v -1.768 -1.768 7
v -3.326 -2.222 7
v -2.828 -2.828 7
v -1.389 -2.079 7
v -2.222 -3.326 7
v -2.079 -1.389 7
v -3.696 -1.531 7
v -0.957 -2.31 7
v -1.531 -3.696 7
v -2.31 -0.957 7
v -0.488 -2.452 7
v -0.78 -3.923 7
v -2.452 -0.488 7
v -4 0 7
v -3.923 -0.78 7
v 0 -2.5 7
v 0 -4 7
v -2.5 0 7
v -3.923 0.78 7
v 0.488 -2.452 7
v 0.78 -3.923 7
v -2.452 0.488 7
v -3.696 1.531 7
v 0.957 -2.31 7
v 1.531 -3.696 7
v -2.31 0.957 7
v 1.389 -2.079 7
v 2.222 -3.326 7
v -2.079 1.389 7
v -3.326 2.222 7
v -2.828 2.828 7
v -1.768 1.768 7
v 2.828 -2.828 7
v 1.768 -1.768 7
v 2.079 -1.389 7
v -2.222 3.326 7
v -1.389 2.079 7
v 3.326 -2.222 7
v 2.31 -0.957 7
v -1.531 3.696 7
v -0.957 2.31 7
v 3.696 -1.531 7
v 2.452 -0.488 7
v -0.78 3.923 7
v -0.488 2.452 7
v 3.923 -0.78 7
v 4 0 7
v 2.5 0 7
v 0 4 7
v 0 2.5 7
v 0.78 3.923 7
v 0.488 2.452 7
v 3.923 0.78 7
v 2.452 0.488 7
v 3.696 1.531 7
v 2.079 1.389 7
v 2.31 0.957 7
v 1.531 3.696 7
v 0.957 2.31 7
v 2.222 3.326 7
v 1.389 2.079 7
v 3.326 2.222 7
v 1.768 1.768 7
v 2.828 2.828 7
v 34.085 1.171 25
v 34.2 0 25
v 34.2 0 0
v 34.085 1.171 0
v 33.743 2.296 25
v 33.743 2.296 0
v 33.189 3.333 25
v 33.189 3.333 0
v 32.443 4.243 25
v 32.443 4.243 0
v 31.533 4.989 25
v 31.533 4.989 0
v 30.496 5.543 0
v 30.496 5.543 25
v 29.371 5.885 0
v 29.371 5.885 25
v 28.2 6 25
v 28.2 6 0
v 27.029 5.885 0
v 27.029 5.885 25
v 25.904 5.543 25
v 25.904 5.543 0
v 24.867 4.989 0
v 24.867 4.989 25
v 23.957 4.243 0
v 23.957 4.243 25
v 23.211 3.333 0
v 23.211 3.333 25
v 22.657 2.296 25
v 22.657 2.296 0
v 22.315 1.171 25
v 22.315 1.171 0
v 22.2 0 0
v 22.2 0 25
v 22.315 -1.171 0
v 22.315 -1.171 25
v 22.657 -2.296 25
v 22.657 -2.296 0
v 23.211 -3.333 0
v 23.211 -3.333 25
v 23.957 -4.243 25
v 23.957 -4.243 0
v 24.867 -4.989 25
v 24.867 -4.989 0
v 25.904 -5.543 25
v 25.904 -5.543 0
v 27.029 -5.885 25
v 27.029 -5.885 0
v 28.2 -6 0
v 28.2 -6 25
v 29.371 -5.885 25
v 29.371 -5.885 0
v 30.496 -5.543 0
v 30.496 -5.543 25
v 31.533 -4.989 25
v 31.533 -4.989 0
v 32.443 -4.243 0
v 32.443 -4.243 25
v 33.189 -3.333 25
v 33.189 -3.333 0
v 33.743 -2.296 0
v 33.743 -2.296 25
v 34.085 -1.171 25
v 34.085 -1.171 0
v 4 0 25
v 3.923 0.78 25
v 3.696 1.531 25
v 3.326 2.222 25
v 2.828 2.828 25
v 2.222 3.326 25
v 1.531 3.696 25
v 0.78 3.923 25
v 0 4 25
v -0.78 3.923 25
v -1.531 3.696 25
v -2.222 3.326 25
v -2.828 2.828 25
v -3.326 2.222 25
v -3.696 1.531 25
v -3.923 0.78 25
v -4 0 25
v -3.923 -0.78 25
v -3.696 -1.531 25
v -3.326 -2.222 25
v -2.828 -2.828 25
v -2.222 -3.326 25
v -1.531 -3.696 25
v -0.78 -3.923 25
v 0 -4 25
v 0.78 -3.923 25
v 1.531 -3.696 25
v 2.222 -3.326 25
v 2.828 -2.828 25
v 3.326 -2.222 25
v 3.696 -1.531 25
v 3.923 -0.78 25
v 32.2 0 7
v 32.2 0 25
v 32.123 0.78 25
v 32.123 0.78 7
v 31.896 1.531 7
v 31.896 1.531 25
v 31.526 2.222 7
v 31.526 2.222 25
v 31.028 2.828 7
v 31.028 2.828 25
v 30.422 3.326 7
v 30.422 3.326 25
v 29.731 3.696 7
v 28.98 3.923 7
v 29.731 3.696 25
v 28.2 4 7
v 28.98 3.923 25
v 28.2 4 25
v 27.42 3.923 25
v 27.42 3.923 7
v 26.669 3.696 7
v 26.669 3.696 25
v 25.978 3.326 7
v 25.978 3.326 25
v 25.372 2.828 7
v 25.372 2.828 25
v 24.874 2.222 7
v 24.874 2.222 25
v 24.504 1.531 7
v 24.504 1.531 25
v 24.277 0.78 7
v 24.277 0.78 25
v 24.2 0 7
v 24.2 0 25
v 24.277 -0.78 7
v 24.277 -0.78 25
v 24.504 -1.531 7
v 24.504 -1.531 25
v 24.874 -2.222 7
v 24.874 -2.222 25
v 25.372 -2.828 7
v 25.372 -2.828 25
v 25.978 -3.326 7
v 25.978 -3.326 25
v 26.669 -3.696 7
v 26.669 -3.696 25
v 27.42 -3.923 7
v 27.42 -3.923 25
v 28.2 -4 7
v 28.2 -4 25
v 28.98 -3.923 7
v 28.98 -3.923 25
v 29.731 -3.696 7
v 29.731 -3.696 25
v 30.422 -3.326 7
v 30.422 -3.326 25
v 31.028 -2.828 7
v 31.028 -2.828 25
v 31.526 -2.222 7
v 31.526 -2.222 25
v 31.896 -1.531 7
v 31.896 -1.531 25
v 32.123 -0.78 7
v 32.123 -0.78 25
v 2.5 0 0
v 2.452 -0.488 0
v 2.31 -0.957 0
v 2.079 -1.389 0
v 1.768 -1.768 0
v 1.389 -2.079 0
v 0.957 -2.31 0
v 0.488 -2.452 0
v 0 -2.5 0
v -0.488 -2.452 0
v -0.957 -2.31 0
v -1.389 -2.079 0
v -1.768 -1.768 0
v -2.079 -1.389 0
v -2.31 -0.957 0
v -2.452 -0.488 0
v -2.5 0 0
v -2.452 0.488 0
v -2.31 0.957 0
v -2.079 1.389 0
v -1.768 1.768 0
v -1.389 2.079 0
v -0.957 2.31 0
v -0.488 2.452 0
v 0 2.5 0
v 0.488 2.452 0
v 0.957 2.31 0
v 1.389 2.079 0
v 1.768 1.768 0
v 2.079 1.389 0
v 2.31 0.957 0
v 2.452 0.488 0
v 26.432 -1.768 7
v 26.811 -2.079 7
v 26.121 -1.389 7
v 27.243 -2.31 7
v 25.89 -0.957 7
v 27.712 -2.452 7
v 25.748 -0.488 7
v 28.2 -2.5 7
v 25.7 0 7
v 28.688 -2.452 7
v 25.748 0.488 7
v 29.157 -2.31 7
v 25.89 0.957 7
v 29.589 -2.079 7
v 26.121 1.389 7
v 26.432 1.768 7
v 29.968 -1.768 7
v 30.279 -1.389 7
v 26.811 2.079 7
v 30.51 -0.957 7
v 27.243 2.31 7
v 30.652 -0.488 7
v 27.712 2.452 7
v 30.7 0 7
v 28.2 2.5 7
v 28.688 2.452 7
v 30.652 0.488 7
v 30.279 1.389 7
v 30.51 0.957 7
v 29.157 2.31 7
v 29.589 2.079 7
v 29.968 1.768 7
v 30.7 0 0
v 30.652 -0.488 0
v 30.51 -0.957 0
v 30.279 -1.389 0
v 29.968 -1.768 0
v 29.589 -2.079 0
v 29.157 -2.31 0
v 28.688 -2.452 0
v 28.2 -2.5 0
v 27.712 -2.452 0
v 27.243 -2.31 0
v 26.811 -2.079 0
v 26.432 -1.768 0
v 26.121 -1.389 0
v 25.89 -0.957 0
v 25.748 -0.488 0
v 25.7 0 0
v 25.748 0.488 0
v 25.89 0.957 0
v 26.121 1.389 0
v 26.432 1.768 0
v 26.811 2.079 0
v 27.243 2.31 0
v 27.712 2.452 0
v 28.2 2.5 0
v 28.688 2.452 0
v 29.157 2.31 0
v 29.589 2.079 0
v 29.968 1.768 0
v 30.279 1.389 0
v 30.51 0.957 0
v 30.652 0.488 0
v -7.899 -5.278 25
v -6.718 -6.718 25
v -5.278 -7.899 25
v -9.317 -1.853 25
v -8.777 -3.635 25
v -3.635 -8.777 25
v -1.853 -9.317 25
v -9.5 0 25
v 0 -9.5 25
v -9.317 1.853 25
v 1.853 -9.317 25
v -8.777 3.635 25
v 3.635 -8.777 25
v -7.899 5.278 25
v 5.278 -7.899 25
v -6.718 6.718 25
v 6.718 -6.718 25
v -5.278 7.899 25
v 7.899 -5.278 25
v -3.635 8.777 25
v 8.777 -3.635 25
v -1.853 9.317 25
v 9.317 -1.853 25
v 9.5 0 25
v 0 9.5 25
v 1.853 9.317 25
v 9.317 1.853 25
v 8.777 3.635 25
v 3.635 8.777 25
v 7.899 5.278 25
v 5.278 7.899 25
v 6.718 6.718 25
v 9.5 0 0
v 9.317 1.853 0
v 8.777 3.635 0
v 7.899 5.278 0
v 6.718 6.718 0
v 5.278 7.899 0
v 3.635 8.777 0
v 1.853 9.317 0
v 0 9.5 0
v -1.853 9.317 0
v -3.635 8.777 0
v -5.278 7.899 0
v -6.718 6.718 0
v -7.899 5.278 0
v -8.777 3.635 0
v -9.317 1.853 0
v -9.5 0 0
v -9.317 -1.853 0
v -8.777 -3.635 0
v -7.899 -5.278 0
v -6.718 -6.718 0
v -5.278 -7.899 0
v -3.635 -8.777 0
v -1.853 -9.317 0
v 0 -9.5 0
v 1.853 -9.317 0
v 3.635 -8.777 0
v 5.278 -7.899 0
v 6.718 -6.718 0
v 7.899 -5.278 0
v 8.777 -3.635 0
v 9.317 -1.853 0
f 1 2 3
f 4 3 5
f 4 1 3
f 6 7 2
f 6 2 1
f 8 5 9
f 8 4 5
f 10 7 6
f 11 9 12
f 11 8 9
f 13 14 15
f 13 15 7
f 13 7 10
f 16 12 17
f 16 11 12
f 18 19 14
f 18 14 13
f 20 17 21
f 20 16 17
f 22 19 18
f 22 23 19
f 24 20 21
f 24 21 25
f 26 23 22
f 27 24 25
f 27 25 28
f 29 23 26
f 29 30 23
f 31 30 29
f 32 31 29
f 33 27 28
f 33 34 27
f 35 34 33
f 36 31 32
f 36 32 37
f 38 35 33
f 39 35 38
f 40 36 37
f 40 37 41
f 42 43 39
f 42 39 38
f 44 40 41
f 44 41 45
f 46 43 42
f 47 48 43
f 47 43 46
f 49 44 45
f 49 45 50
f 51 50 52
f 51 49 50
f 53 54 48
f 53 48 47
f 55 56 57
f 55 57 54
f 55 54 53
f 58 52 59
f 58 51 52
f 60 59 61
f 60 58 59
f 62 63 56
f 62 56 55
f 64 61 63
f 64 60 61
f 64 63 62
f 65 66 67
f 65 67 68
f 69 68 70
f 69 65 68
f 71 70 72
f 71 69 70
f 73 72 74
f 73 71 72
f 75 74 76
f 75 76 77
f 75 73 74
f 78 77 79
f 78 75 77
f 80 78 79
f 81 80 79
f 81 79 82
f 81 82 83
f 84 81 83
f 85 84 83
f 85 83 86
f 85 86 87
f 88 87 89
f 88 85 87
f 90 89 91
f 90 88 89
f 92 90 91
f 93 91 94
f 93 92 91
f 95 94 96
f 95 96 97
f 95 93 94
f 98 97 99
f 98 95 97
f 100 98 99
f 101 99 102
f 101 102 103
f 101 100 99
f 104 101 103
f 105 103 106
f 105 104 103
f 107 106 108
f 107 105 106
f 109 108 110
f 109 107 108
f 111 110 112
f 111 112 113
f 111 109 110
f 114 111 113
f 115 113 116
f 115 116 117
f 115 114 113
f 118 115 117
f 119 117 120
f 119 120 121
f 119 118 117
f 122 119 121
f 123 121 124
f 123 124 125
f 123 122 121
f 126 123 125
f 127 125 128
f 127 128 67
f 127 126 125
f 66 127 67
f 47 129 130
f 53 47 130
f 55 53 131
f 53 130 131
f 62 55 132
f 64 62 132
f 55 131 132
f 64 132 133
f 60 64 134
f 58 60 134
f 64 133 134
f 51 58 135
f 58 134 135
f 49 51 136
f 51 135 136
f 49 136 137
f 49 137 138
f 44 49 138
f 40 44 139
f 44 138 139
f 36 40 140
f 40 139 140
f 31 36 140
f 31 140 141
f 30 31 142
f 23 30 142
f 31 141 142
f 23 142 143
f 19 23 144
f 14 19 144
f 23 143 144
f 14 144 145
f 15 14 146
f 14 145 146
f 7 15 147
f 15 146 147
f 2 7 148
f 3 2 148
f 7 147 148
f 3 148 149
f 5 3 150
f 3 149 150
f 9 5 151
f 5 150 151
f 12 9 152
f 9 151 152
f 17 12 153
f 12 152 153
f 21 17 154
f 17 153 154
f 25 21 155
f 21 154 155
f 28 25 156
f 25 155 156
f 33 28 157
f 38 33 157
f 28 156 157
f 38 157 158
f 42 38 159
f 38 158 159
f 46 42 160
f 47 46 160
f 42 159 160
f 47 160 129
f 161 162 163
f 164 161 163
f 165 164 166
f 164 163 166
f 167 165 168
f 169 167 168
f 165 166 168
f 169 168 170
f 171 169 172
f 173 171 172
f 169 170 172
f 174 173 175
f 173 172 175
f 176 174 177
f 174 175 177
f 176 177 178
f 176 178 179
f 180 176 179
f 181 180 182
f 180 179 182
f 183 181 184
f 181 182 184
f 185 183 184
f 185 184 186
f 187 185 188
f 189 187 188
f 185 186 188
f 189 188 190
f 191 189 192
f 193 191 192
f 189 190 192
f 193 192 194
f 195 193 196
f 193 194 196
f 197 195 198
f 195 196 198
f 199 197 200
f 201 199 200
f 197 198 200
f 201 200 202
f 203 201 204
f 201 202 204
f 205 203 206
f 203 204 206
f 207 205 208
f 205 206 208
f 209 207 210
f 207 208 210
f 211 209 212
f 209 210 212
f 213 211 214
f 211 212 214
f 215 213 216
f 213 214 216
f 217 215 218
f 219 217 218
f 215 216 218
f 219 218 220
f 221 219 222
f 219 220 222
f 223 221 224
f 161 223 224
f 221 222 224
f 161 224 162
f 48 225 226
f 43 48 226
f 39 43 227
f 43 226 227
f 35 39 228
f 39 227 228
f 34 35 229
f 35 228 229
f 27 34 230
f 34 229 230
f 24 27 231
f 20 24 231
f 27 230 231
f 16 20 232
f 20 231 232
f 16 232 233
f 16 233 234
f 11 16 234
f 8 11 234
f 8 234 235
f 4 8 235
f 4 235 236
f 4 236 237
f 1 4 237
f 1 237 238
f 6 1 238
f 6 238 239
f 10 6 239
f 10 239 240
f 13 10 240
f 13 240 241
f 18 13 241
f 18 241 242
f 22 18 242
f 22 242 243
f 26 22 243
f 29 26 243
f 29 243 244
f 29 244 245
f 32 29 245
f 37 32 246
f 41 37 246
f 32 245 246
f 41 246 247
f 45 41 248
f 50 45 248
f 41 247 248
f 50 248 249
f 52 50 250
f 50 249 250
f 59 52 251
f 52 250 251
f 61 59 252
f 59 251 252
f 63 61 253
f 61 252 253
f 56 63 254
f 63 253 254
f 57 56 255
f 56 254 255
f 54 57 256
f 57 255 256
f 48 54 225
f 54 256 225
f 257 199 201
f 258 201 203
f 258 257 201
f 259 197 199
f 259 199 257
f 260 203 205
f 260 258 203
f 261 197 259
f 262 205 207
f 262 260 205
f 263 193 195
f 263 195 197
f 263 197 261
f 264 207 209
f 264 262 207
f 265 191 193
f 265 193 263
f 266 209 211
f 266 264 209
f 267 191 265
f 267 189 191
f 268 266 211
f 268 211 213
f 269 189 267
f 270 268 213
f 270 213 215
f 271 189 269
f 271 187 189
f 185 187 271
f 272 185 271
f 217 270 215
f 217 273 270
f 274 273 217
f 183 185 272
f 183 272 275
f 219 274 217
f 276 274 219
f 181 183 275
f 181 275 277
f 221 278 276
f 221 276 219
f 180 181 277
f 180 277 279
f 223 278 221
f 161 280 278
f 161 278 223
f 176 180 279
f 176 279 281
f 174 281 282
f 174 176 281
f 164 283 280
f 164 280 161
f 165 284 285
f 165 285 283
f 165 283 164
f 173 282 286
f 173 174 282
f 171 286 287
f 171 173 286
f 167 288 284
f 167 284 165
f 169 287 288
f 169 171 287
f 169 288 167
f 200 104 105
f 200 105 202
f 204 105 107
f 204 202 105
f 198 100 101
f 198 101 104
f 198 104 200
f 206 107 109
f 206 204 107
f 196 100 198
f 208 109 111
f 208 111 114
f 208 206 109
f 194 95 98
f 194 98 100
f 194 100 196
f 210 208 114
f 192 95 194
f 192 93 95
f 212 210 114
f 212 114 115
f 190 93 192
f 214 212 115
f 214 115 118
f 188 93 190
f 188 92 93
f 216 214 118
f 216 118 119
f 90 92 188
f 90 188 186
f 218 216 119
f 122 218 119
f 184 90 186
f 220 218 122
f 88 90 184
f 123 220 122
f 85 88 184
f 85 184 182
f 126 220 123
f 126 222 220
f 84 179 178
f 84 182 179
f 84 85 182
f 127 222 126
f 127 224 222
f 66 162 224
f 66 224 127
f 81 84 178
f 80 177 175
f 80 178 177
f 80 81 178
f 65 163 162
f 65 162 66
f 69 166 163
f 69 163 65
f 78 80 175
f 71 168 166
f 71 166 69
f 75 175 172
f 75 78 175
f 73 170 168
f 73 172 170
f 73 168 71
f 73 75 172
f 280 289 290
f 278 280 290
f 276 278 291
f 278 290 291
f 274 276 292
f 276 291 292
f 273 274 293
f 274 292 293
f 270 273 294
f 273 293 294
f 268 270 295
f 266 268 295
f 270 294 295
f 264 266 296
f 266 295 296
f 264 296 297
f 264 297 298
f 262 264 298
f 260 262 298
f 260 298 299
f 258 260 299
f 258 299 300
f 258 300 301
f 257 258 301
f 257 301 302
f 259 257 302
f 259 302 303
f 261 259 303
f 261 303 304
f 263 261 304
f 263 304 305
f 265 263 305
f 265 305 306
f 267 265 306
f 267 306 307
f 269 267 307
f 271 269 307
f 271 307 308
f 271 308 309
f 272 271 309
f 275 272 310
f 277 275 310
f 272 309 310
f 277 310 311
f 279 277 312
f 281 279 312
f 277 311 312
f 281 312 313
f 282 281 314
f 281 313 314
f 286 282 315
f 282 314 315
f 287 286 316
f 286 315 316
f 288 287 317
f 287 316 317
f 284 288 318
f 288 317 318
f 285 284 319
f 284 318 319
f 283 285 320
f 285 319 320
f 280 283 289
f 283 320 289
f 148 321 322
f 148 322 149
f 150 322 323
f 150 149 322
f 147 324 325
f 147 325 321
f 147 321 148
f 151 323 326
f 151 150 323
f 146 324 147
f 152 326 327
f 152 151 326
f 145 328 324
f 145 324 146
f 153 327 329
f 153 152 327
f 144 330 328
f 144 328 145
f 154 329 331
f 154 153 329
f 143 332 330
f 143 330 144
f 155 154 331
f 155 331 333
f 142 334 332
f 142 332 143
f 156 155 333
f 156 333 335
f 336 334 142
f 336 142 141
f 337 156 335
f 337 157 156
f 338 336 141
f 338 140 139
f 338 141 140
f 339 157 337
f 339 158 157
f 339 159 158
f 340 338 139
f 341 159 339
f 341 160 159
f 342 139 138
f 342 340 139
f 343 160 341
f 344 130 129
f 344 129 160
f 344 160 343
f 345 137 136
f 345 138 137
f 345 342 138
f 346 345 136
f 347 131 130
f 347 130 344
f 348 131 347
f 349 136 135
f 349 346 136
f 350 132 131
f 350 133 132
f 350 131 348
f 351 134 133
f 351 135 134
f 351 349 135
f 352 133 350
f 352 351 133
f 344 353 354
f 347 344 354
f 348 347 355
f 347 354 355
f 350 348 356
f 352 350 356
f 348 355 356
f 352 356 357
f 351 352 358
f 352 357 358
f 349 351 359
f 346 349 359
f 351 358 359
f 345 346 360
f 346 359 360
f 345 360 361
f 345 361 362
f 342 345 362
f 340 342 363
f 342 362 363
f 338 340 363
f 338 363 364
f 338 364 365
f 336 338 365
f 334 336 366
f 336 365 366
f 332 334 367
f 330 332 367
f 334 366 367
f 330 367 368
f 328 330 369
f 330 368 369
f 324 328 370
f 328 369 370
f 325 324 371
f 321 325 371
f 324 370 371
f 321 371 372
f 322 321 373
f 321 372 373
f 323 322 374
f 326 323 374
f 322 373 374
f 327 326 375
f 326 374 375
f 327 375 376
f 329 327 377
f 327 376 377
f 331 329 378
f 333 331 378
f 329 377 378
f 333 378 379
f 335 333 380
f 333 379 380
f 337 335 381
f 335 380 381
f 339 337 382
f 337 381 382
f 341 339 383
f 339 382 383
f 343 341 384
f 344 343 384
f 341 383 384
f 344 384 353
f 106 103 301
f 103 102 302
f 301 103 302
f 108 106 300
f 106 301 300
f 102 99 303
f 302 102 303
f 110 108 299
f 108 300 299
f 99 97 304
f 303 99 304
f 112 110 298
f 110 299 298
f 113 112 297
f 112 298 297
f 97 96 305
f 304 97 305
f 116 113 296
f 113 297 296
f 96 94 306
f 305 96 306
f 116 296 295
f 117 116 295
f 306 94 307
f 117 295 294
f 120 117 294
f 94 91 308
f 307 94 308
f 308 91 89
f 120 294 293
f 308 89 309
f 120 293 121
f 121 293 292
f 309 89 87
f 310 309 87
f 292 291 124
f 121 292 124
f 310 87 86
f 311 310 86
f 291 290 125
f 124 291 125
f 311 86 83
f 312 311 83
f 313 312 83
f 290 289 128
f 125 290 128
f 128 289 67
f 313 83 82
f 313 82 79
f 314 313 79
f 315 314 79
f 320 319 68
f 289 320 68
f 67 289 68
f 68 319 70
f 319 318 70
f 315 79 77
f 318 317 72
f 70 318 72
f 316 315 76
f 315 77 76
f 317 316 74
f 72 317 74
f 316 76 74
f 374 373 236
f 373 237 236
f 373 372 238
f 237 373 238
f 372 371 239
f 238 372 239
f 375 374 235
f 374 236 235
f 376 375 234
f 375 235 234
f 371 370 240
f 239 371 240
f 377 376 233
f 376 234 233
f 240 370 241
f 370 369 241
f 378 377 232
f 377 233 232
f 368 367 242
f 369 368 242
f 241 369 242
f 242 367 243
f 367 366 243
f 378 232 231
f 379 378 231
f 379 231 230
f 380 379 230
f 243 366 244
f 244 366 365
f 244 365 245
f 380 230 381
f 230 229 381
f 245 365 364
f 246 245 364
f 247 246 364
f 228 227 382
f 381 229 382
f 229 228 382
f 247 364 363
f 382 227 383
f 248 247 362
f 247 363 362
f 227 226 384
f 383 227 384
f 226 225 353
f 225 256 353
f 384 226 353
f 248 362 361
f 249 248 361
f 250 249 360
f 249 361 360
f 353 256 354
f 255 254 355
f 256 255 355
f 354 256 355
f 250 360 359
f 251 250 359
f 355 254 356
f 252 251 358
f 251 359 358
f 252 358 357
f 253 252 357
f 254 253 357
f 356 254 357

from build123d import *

# Parameters (mm, degrees)
F0_R     = 9.5
F1_DEPTH = 25
F2_R     = 4
F3_DEPTH = 18
F4_R     = 2.5
F5_DEPTH = 25
F7_R     = 9.5
F7_R_2   = 6
F8_DEPTH = 25


with BuildPart() as f1:
    # F0 (on Top) → F1 (new body)
    with BuildSketch(Plane.XY):
        Circle(F0_R)
    extrude(amount=F1_DEPTH)

    # F2 (on face) → F3 (cut)
    with BuildSketch(Plane.XY.offset(25)):
        Circle(F2_R)
    extrude(amount=-F3_DEPTH, mode=Mode.SUBTRACT)

    # F4 (on face) → F5 (cut)
    with BuildSketch(Plane(origin=(0, 0, 0), x_dir=(1, 0, 0), z_dir=(0, 0, -1))):
        Circle(F4_R)
    extrude(amount=-F5_DEPTH, mode=Mode.SUBTRACT)


with BuildPart() as f6_1:
    # F6: copy of F1
    add(f1.part.moved(Location((28.2, 0, 0))))

    # F7 (on face) → F8 (cut)
    with BuildSketch(Plane.XY.offset(25)):
        with Locations((28.2, 0)):
            Circle(F7_R)
        with Locations((28.2, 0)):
            Circle(F7_R_2, mode=Mode.SUBTRACT)
    extrude(amount=-F8_DEPTH, mode=Mode.SUBTRACT)


solid = Compound([f1.part, f6_1.part])
